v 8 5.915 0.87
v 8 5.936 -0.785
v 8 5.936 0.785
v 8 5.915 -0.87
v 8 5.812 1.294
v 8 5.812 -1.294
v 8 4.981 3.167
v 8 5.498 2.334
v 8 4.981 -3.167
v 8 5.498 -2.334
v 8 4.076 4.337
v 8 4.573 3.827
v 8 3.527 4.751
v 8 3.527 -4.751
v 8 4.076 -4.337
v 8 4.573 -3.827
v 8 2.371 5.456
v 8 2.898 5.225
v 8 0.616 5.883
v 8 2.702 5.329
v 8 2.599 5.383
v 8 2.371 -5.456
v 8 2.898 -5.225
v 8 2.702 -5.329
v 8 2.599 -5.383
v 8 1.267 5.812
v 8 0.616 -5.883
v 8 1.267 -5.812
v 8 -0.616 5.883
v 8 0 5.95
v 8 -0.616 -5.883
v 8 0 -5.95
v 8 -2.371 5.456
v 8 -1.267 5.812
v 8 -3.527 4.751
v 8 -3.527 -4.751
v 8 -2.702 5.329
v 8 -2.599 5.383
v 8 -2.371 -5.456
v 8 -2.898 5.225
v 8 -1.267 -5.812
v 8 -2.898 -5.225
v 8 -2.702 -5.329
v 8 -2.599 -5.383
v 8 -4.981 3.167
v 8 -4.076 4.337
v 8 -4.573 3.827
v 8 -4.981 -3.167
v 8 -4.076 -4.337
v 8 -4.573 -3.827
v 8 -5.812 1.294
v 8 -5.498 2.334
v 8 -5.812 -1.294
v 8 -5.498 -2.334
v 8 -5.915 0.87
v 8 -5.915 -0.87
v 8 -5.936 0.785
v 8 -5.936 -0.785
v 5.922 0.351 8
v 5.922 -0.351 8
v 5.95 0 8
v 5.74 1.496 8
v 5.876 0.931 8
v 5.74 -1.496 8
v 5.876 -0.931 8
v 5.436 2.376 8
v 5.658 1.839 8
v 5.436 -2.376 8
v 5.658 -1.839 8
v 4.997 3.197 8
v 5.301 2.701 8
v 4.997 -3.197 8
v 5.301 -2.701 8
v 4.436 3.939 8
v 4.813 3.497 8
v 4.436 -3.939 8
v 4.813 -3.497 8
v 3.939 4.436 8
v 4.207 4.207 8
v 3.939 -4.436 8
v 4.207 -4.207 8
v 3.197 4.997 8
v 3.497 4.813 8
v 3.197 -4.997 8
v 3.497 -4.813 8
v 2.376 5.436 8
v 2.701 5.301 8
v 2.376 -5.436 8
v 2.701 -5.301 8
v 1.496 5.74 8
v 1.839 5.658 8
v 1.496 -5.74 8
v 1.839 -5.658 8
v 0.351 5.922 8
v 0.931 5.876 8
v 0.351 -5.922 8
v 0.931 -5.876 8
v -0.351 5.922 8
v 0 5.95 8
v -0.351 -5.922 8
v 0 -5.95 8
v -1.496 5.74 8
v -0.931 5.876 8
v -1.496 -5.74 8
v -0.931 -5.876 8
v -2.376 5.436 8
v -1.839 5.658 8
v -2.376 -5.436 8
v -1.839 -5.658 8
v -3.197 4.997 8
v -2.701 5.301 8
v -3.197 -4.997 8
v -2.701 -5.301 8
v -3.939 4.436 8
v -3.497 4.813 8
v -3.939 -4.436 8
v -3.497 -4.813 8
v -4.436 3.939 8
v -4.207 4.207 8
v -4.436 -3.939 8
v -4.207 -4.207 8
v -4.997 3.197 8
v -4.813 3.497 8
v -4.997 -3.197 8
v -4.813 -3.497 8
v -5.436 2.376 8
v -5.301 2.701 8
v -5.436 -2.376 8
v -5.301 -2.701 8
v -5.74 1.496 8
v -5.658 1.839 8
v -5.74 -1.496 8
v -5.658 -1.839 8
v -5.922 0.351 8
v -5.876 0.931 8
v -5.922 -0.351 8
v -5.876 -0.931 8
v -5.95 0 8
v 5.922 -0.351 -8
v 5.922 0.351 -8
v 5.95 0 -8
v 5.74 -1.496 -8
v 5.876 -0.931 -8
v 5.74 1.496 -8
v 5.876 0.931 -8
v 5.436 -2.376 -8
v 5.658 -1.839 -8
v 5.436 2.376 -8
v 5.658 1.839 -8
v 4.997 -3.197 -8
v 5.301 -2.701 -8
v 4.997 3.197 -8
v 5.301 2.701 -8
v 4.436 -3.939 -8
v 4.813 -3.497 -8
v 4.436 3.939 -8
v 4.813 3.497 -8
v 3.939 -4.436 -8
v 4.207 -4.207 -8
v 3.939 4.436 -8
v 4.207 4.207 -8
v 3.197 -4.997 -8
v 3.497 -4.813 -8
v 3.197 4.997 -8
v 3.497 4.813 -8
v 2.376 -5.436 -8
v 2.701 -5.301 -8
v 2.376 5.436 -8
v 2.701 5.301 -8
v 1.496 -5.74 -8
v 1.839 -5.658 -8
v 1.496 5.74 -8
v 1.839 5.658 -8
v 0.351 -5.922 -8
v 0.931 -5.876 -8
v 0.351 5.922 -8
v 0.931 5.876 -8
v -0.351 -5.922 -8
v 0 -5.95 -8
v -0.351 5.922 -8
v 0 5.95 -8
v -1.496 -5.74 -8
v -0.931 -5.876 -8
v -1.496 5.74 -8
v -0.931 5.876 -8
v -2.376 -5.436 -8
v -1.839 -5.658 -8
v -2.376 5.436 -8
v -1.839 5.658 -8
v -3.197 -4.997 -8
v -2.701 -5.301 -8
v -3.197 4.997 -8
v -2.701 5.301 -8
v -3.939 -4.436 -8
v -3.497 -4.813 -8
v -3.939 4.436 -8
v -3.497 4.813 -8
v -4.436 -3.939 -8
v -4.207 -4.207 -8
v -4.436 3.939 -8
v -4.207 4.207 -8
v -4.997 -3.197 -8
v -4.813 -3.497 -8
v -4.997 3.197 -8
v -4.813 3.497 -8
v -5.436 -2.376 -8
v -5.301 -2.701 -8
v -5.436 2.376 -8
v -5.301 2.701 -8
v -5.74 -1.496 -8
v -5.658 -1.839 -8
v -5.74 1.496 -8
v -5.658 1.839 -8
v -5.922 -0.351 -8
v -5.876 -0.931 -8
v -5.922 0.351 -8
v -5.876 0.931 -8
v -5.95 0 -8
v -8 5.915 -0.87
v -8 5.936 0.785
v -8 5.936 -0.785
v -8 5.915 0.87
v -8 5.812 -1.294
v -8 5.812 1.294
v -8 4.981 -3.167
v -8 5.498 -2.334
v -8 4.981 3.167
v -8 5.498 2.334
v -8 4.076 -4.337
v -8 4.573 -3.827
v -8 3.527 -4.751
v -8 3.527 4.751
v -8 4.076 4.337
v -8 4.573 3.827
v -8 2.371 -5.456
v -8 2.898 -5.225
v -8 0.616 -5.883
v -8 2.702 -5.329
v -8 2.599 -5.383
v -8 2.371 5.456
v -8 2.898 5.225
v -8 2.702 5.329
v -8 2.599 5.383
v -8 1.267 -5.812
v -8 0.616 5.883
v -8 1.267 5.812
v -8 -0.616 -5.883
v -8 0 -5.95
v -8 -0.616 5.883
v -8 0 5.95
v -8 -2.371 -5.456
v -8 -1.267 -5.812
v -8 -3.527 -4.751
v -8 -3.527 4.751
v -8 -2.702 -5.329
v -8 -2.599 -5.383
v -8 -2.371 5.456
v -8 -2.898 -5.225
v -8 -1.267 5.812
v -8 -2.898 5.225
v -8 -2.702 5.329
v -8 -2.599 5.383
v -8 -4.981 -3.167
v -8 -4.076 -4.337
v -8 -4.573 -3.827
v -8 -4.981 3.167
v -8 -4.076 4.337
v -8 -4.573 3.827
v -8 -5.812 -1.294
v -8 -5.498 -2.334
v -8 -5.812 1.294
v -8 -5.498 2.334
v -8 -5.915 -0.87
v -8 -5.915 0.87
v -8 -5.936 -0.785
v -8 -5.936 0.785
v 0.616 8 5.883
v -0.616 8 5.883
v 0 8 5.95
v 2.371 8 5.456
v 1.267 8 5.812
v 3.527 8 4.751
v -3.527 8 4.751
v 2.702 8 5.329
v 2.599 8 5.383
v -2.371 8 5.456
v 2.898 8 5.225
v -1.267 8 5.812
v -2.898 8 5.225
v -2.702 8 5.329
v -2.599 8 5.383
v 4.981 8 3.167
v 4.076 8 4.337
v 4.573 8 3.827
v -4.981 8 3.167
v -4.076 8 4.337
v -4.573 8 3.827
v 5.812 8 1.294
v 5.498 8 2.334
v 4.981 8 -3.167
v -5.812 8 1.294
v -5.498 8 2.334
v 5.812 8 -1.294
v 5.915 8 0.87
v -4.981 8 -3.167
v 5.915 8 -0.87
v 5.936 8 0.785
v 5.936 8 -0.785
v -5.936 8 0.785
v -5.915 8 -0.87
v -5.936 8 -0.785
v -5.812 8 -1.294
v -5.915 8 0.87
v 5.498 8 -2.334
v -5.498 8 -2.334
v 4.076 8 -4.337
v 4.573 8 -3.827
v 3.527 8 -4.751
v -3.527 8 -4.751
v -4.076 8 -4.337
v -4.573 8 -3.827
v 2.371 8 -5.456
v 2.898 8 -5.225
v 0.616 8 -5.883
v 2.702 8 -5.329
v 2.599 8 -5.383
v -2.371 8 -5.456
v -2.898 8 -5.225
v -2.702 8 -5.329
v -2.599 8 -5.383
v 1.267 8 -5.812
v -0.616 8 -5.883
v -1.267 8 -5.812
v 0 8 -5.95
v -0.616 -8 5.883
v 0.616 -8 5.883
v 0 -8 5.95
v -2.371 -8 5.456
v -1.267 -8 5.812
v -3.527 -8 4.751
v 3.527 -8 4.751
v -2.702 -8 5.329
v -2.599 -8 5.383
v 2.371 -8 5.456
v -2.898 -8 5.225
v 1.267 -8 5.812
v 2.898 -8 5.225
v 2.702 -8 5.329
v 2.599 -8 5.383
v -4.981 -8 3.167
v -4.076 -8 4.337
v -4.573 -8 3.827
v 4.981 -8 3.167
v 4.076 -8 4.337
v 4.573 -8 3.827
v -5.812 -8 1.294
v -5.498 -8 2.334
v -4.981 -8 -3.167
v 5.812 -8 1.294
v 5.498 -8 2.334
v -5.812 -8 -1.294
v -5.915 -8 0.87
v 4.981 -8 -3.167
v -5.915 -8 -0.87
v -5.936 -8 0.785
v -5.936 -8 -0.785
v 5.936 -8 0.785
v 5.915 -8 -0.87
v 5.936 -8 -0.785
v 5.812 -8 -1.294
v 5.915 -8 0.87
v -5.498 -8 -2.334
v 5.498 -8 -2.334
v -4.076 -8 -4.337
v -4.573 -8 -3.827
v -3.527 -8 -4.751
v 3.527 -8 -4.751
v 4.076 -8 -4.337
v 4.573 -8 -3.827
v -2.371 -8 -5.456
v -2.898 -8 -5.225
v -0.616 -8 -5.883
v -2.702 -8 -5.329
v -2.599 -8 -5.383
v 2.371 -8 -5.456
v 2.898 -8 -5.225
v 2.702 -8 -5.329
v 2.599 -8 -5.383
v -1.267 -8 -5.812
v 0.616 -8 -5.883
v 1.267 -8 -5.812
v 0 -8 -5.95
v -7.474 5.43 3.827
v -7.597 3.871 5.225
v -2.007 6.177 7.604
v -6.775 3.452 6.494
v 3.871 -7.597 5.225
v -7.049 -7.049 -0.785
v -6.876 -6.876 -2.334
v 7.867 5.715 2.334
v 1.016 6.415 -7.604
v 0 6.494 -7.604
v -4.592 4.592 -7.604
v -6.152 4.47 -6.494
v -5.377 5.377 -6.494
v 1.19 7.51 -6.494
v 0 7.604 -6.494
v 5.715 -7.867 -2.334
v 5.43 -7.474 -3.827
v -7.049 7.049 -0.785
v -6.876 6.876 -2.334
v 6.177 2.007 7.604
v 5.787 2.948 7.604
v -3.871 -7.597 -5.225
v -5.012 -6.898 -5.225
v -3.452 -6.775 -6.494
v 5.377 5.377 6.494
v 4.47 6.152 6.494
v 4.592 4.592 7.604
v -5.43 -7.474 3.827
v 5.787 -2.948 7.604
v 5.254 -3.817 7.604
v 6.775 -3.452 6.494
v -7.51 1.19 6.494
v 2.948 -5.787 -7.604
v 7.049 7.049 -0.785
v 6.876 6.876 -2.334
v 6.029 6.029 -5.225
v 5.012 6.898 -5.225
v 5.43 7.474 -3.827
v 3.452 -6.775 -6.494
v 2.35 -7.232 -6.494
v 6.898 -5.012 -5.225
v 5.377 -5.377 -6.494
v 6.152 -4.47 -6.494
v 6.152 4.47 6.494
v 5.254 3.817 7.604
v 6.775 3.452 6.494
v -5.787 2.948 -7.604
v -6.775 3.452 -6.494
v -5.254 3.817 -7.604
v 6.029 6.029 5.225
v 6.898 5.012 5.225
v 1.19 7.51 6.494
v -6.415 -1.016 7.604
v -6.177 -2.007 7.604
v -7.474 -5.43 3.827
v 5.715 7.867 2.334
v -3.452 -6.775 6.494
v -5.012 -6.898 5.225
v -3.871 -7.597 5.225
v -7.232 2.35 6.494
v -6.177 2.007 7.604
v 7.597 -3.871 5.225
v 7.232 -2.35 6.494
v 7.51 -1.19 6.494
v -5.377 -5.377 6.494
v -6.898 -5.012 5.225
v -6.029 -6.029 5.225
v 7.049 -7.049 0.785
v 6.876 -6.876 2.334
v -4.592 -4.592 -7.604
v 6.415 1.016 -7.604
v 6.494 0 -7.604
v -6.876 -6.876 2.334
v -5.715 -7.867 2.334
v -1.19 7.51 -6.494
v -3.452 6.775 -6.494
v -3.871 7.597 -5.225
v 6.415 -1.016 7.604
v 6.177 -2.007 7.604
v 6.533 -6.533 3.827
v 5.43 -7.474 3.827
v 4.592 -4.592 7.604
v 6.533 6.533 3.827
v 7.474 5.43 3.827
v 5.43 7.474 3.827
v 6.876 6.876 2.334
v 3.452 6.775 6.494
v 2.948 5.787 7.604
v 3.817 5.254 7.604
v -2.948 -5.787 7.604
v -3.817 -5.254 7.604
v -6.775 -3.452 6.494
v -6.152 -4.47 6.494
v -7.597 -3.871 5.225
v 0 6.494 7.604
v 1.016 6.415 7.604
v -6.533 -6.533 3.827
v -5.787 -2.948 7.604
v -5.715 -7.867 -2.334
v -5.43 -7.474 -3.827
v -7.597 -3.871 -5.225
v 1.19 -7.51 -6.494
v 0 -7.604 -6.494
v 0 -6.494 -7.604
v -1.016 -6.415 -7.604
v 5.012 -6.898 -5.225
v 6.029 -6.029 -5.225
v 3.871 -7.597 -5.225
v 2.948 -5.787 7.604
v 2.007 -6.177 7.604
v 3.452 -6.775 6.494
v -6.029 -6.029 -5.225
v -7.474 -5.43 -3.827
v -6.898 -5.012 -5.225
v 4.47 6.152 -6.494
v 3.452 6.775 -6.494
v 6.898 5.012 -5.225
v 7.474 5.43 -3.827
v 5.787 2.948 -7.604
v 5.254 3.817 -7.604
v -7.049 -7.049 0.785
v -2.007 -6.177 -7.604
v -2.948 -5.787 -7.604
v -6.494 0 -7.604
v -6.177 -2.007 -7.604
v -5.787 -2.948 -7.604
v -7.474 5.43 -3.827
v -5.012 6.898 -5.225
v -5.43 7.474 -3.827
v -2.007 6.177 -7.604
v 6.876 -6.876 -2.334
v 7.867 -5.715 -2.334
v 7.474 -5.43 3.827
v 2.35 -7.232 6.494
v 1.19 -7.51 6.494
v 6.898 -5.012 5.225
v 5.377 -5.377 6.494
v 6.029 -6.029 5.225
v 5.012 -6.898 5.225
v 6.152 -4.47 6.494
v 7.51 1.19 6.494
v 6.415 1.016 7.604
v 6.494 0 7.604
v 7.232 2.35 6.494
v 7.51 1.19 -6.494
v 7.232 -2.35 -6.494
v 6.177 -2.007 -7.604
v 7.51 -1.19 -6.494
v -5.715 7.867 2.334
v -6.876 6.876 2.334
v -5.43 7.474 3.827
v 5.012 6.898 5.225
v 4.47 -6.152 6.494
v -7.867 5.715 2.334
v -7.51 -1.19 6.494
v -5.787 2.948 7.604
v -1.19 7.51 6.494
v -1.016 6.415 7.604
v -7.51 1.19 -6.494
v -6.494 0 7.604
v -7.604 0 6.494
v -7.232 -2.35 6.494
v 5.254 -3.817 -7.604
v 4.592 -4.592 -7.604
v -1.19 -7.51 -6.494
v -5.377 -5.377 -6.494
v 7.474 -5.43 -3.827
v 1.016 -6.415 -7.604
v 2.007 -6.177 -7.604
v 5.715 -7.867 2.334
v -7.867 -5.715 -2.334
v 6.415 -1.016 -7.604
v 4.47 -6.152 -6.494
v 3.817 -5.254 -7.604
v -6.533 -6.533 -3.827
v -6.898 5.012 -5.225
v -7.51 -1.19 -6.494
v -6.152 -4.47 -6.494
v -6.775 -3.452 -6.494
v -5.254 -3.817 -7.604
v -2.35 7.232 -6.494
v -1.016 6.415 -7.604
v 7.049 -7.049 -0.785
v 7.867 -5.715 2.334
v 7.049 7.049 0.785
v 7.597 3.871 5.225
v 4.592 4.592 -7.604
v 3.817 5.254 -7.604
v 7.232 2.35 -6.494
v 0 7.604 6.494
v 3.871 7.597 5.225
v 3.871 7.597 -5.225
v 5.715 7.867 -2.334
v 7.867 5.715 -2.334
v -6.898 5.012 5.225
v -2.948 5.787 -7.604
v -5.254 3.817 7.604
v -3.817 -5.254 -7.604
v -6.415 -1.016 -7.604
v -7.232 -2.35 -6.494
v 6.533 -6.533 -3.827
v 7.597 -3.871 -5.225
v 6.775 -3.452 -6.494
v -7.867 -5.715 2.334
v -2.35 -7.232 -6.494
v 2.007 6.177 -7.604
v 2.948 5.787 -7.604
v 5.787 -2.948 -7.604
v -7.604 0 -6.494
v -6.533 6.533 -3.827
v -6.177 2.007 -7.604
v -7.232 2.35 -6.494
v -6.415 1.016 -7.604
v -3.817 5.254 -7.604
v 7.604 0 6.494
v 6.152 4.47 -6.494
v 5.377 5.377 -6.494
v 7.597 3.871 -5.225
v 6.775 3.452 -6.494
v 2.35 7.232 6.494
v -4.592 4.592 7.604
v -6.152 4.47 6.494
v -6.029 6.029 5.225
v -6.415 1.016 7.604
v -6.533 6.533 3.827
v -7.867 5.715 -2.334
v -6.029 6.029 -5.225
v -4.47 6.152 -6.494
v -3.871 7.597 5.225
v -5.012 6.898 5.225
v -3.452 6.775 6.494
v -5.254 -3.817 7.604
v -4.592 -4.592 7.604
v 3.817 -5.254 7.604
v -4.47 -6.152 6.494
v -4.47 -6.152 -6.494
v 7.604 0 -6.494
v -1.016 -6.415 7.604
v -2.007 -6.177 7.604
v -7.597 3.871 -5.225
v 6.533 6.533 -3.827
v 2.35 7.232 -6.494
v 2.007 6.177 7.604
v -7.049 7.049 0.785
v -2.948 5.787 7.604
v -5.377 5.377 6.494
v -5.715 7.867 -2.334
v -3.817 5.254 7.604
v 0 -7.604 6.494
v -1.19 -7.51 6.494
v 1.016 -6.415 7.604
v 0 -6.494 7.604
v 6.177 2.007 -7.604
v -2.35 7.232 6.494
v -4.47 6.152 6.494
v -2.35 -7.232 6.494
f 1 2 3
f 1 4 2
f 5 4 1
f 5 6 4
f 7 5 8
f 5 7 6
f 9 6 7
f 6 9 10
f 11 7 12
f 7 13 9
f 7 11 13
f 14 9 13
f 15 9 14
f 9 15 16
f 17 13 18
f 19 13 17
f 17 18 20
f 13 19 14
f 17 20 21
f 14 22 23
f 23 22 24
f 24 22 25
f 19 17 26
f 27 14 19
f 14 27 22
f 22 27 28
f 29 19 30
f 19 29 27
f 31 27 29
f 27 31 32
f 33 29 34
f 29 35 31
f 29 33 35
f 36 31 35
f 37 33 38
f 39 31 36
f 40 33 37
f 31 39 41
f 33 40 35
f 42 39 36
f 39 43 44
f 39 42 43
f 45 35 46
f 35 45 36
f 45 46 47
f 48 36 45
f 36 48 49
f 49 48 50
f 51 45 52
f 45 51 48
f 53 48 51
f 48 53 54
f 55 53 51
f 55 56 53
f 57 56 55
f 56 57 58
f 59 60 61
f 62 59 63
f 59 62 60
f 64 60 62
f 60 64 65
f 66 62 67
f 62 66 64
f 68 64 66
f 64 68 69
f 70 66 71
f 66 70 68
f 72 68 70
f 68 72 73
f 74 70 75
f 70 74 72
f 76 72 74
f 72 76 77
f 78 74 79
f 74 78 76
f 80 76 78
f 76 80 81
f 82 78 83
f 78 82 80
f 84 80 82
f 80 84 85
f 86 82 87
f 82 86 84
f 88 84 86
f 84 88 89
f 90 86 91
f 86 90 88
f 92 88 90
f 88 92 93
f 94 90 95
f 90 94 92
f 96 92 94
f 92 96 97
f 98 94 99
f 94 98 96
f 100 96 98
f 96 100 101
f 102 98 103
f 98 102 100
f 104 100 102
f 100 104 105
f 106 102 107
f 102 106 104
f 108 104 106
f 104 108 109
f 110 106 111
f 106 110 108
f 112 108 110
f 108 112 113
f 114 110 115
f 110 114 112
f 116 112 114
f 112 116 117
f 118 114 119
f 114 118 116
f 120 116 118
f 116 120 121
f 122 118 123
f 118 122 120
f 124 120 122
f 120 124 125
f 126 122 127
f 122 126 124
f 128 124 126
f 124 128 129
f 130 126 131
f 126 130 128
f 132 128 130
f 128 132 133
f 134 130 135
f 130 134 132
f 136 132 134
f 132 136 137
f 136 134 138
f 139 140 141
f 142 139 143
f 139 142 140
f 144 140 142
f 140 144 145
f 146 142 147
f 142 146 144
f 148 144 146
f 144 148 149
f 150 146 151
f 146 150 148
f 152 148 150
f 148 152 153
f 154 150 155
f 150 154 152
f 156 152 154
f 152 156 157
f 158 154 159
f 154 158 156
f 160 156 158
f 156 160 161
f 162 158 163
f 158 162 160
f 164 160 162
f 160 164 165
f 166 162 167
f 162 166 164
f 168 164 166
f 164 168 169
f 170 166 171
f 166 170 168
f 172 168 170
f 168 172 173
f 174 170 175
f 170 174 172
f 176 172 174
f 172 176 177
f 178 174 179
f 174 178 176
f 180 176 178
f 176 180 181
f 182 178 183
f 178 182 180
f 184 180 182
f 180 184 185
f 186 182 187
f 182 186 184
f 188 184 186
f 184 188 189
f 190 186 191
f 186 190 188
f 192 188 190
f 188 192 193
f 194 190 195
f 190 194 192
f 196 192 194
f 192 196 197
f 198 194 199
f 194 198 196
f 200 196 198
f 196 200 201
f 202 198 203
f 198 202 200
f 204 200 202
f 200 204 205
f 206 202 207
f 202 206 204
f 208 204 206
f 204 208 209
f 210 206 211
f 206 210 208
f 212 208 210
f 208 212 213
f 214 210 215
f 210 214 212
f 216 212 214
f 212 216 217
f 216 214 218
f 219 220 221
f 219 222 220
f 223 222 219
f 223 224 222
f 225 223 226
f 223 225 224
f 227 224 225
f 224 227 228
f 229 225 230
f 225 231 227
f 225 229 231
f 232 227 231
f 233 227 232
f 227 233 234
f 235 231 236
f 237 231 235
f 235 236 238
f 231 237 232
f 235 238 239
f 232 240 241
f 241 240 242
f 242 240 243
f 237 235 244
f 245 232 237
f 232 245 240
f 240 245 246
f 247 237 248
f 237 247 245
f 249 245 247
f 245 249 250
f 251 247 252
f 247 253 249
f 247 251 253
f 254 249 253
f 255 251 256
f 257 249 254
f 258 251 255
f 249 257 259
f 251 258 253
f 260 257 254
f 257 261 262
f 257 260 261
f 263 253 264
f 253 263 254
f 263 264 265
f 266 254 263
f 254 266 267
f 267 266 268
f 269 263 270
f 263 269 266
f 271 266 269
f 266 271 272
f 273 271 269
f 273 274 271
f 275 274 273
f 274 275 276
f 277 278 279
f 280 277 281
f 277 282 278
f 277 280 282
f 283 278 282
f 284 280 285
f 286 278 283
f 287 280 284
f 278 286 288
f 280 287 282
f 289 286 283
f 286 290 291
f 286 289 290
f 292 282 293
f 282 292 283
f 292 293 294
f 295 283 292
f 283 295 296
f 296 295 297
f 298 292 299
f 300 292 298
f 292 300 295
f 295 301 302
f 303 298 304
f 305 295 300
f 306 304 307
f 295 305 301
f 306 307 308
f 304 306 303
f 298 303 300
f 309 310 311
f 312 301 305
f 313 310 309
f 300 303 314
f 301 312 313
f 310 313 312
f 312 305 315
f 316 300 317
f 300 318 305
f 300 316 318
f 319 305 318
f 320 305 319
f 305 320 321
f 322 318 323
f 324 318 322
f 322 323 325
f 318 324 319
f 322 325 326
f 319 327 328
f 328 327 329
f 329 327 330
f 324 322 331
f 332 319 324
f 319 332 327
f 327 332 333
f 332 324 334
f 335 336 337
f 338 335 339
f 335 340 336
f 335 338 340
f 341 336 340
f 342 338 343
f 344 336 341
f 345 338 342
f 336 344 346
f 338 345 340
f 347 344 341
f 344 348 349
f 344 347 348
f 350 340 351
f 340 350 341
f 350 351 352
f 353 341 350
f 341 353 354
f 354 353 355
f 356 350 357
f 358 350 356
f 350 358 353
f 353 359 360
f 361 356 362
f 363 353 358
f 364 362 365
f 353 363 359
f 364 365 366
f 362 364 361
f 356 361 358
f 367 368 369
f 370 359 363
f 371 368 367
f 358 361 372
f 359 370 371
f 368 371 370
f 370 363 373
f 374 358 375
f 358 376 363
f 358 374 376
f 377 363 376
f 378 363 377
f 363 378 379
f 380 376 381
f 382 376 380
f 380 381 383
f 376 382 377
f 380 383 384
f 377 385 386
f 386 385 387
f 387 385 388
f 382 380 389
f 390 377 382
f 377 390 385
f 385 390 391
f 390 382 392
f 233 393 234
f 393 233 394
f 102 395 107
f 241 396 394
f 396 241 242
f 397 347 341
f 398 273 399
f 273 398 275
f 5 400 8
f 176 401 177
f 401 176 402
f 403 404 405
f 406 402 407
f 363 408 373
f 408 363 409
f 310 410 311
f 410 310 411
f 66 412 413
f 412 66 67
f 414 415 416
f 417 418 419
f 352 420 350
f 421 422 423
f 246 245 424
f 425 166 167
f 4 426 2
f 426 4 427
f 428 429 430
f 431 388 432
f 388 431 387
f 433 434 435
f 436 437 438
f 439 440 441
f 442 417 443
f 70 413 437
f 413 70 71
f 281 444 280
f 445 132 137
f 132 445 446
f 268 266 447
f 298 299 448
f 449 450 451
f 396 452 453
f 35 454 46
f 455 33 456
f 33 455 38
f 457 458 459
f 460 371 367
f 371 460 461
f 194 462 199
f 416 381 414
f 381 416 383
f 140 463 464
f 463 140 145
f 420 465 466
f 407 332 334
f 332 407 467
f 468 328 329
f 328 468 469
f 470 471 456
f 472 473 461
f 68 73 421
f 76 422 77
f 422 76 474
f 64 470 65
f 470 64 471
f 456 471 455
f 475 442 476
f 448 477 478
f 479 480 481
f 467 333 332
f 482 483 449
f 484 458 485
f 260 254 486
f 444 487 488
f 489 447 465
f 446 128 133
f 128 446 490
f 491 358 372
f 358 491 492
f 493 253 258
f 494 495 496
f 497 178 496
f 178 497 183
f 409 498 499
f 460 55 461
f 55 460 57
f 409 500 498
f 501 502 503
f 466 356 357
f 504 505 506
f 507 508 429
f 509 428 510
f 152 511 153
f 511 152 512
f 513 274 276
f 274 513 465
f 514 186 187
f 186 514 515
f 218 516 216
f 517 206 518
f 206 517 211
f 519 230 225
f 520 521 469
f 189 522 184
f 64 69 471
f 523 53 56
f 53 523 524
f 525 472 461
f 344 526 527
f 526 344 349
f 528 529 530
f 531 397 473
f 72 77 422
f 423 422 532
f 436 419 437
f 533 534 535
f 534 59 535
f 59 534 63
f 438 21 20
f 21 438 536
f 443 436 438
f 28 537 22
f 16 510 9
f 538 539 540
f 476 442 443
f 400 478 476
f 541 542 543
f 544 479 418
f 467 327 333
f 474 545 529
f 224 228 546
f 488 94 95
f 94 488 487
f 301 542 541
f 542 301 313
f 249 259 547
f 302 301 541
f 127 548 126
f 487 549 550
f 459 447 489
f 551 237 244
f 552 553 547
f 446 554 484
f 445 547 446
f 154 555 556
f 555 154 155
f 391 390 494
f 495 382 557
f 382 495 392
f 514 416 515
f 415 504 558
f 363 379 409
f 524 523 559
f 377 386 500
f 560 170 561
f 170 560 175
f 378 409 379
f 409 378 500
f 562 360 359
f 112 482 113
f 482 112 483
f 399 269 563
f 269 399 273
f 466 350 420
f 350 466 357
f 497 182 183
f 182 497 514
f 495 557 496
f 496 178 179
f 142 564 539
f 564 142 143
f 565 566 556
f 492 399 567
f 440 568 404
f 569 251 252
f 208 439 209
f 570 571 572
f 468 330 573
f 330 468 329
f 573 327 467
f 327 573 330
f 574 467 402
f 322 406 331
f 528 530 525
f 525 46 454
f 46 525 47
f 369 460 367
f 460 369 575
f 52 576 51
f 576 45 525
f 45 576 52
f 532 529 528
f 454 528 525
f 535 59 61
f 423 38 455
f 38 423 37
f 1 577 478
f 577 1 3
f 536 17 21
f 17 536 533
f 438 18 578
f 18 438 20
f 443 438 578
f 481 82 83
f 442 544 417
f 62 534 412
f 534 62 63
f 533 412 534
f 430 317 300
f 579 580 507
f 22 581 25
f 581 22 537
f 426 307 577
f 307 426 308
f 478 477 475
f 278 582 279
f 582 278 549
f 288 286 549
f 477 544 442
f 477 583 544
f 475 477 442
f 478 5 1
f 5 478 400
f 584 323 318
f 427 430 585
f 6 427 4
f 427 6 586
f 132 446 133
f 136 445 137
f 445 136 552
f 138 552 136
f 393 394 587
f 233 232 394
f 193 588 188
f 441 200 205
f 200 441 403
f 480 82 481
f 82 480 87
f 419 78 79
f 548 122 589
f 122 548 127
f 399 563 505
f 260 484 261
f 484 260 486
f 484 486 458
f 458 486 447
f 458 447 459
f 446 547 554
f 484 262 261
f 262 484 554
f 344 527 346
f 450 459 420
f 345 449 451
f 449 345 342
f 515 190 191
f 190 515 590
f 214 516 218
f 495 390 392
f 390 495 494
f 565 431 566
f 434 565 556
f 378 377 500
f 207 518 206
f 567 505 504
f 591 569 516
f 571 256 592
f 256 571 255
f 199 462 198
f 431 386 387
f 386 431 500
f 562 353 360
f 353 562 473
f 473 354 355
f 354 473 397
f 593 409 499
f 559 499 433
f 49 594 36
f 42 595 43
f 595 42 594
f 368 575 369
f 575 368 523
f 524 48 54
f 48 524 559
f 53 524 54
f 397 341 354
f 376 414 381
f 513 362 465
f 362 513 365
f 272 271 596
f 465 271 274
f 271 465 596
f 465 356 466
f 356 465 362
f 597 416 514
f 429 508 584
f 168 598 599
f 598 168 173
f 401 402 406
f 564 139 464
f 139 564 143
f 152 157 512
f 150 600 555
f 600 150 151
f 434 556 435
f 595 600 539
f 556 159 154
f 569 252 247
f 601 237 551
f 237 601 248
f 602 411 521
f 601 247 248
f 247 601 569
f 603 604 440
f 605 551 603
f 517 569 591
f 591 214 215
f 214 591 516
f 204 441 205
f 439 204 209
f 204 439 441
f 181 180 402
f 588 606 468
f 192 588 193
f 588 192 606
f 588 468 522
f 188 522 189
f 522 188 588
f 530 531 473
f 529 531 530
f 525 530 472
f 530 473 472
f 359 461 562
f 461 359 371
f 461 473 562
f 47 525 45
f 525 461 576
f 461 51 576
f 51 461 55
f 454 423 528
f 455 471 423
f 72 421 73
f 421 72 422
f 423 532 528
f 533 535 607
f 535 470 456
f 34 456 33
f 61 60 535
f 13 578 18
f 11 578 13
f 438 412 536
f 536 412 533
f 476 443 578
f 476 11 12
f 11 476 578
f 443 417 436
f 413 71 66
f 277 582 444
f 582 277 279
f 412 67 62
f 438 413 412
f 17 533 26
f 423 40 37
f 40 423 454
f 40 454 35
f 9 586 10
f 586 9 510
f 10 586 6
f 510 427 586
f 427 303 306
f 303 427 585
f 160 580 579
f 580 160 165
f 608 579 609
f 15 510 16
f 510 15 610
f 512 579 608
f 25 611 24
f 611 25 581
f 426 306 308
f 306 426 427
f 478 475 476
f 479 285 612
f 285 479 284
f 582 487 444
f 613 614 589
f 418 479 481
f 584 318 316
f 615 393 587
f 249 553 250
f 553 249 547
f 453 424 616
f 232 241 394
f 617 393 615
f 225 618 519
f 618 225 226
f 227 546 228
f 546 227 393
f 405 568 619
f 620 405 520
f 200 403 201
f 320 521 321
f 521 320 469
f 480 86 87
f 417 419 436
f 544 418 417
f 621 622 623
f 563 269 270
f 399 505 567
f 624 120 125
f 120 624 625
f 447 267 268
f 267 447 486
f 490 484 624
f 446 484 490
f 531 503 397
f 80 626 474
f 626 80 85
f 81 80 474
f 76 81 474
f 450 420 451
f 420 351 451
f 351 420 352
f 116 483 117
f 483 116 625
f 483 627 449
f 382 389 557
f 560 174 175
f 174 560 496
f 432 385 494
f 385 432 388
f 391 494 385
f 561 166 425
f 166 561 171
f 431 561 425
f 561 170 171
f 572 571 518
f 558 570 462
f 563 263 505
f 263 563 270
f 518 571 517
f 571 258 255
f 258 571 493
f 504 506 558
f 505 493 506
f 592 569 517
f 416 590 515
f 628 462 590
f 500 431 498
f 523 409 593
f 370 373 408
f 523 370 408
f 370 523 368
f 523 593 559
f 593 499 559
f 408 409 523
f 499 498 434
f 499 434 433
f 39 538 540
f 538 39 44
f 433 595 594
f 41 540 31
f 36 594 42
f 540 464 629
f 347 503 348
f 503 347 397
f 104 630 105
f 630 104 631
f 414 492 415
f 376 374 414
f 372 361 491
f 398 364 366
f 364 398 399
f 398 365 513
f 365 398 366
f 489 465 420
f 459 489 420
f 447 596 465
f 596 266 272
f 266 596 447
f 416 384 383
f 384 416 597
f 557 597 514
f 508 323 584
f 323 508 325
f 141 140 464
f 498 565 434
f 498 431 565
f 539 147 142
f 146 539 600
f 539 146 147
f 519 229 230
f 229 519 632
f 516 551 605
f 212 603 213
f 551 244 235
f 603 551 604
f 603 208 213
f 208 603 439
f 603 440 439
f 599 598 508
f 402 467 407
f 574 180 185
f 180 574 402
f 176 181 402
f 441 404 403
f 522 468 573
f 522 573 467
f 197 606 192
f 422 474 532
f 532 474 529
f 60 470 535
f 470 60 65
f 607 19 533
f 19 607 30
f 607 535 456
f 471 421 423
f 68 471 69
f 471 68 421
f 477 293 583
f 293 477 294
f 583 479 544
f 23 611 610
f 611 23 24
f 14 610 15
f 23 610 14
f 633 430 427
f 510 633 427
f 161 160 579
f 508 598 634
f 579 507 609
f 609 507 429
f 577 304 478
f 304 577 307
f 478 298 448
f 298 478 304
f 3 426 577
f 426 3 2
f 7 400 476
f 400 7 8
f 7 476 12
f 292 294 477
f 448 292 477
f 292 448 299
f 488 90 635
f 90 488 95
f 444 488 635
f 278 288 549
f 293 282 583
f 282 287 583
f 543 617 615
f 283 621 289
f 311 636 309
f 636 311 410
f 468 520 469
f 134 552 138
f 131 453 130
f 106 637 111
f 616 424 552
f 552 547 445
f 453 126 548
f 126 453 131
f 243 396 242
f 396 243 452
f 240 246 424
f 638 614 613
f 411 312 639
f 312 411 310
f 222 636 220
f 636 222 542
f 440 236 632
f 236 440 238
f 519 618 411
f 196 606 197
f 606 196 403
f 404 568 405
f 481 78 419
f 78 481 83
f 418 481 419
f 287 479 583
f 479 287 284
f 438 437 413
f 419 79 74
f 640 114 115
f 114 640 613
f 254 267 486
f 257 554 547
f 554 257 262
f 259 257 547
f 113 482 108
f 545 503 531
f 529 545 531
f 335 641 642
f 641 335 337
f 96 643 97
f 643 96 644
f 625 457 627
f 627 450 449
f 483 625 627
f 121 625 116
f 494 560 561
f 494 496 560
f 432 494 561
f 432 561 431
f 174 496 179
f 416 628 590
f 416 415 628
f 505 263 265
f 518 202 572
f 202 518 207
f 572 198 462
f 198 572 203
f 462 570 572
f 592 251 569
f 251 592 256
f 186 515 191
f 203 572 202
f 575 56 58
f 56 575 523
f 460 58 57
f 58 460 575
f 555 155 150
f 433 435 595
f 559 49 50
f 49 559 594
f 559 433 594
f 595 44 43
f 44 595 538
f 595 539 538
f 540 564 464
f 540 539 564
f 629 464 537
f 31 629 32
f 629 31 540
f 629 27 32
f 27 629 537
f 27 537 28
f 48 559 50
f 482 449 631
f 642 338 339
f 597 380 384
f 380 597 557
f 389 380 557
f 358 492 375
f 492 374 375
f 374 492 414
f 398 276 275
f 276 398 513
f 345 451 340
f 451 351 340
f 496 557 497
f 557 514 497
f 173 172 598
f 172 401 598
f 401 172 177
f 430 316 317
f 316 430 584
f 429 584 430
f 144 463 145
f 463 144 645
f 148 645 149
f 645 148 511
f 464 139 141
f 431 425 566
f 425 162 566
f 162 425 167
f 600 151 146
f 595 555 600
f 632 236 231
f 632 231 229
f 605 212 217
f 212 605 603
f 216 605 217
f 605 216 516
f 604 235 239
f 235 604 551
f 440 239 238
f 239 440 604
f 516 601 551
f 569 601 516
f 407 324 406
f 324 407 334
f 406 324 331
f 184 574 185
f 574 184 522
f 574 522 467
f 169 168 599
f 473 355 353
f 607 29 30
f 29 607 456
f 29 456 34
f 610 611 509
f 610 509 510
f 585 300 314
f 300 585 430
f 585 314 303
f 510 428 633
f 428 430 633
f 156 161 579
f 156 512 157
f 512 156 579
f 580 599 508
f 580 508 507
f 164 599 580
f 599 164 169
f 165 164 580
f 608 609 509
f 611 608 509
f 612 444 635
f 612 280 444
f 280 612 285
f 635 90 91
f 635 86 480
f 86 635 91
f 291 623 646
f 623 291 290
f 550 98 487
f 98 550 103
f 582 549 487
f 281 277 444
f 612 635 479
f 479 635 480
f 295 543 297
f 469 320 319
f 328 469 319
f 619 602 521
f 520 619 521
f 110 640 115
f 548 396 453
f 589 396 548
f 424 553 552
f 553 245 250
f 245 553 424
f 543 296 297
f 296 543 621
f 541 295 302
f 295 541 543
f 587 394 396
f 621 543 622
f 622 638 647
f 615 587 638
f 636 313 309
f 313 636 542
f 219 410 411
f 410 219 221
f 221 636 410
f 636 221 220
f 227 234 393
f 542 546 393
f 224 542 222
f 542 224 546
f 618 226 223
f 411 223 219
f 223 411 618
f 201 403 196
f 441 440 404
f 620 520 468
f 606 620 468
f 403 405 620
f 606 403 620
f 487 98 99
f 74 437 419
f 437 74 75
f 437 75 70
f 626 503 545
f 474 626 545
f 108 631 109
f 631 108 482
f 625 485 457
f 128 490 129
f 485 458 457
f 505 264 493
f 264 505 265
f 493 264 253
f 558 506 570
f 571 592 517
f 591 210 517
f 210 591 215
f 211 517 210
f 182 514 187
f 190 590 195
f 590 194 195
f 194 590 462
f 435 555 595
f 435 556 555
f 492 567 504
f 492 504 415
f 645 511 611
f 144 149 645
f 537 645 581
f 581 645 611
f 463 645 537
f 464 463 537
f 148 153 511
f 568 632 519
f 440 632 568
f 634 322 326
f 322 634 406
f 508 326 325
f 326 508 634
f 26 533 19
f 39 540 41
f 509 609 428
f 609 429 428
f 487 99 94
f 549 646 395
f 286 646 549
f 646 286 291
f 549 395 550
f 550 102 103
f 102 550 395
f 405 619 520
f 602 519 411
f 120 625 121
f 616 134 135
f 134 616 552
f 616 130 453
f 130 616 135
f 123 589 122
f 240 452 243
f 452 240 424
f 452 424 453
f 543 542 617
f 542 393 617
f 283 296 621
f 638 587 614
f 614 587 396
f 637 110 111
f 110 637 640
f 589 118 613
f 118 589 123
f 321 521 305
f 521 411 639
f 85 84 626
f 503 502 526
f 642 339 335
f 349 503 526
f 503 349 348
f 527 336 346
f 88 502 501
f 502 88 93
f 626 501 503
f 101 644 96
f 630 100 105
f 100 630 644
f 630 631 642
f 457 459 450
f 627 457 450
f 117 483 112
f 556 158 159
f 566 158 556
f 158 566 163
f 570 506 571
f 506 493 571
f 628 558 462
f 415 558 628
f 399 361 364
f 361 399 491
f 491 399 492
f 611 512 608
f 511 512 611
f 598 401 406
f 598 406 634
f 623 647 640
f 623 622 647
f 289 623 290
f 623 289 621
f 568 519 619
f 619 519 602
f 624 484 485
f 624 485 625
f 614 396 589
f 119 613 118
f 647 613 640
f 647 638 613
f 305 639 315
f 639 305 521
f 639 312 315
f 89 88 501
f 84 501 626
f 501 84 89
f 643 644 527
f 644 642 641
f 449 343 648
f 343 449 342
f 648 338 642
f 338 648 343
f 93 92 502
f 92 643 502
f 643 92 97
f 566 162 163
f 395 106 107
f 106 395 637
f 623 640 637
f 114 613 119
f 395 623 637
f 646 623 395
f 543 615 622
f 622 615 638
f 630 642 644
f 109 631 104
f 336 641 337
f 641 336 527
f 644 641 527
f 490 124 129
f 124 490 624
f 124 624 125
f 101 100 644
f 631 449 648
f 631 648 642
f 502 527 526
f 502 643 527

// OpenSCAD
// Construct: intersection() — the lens shared by a cube and a sphere.
intersection() {
    cube(16, center = true);
    sphere(r = 10, $fn = 40);
}
